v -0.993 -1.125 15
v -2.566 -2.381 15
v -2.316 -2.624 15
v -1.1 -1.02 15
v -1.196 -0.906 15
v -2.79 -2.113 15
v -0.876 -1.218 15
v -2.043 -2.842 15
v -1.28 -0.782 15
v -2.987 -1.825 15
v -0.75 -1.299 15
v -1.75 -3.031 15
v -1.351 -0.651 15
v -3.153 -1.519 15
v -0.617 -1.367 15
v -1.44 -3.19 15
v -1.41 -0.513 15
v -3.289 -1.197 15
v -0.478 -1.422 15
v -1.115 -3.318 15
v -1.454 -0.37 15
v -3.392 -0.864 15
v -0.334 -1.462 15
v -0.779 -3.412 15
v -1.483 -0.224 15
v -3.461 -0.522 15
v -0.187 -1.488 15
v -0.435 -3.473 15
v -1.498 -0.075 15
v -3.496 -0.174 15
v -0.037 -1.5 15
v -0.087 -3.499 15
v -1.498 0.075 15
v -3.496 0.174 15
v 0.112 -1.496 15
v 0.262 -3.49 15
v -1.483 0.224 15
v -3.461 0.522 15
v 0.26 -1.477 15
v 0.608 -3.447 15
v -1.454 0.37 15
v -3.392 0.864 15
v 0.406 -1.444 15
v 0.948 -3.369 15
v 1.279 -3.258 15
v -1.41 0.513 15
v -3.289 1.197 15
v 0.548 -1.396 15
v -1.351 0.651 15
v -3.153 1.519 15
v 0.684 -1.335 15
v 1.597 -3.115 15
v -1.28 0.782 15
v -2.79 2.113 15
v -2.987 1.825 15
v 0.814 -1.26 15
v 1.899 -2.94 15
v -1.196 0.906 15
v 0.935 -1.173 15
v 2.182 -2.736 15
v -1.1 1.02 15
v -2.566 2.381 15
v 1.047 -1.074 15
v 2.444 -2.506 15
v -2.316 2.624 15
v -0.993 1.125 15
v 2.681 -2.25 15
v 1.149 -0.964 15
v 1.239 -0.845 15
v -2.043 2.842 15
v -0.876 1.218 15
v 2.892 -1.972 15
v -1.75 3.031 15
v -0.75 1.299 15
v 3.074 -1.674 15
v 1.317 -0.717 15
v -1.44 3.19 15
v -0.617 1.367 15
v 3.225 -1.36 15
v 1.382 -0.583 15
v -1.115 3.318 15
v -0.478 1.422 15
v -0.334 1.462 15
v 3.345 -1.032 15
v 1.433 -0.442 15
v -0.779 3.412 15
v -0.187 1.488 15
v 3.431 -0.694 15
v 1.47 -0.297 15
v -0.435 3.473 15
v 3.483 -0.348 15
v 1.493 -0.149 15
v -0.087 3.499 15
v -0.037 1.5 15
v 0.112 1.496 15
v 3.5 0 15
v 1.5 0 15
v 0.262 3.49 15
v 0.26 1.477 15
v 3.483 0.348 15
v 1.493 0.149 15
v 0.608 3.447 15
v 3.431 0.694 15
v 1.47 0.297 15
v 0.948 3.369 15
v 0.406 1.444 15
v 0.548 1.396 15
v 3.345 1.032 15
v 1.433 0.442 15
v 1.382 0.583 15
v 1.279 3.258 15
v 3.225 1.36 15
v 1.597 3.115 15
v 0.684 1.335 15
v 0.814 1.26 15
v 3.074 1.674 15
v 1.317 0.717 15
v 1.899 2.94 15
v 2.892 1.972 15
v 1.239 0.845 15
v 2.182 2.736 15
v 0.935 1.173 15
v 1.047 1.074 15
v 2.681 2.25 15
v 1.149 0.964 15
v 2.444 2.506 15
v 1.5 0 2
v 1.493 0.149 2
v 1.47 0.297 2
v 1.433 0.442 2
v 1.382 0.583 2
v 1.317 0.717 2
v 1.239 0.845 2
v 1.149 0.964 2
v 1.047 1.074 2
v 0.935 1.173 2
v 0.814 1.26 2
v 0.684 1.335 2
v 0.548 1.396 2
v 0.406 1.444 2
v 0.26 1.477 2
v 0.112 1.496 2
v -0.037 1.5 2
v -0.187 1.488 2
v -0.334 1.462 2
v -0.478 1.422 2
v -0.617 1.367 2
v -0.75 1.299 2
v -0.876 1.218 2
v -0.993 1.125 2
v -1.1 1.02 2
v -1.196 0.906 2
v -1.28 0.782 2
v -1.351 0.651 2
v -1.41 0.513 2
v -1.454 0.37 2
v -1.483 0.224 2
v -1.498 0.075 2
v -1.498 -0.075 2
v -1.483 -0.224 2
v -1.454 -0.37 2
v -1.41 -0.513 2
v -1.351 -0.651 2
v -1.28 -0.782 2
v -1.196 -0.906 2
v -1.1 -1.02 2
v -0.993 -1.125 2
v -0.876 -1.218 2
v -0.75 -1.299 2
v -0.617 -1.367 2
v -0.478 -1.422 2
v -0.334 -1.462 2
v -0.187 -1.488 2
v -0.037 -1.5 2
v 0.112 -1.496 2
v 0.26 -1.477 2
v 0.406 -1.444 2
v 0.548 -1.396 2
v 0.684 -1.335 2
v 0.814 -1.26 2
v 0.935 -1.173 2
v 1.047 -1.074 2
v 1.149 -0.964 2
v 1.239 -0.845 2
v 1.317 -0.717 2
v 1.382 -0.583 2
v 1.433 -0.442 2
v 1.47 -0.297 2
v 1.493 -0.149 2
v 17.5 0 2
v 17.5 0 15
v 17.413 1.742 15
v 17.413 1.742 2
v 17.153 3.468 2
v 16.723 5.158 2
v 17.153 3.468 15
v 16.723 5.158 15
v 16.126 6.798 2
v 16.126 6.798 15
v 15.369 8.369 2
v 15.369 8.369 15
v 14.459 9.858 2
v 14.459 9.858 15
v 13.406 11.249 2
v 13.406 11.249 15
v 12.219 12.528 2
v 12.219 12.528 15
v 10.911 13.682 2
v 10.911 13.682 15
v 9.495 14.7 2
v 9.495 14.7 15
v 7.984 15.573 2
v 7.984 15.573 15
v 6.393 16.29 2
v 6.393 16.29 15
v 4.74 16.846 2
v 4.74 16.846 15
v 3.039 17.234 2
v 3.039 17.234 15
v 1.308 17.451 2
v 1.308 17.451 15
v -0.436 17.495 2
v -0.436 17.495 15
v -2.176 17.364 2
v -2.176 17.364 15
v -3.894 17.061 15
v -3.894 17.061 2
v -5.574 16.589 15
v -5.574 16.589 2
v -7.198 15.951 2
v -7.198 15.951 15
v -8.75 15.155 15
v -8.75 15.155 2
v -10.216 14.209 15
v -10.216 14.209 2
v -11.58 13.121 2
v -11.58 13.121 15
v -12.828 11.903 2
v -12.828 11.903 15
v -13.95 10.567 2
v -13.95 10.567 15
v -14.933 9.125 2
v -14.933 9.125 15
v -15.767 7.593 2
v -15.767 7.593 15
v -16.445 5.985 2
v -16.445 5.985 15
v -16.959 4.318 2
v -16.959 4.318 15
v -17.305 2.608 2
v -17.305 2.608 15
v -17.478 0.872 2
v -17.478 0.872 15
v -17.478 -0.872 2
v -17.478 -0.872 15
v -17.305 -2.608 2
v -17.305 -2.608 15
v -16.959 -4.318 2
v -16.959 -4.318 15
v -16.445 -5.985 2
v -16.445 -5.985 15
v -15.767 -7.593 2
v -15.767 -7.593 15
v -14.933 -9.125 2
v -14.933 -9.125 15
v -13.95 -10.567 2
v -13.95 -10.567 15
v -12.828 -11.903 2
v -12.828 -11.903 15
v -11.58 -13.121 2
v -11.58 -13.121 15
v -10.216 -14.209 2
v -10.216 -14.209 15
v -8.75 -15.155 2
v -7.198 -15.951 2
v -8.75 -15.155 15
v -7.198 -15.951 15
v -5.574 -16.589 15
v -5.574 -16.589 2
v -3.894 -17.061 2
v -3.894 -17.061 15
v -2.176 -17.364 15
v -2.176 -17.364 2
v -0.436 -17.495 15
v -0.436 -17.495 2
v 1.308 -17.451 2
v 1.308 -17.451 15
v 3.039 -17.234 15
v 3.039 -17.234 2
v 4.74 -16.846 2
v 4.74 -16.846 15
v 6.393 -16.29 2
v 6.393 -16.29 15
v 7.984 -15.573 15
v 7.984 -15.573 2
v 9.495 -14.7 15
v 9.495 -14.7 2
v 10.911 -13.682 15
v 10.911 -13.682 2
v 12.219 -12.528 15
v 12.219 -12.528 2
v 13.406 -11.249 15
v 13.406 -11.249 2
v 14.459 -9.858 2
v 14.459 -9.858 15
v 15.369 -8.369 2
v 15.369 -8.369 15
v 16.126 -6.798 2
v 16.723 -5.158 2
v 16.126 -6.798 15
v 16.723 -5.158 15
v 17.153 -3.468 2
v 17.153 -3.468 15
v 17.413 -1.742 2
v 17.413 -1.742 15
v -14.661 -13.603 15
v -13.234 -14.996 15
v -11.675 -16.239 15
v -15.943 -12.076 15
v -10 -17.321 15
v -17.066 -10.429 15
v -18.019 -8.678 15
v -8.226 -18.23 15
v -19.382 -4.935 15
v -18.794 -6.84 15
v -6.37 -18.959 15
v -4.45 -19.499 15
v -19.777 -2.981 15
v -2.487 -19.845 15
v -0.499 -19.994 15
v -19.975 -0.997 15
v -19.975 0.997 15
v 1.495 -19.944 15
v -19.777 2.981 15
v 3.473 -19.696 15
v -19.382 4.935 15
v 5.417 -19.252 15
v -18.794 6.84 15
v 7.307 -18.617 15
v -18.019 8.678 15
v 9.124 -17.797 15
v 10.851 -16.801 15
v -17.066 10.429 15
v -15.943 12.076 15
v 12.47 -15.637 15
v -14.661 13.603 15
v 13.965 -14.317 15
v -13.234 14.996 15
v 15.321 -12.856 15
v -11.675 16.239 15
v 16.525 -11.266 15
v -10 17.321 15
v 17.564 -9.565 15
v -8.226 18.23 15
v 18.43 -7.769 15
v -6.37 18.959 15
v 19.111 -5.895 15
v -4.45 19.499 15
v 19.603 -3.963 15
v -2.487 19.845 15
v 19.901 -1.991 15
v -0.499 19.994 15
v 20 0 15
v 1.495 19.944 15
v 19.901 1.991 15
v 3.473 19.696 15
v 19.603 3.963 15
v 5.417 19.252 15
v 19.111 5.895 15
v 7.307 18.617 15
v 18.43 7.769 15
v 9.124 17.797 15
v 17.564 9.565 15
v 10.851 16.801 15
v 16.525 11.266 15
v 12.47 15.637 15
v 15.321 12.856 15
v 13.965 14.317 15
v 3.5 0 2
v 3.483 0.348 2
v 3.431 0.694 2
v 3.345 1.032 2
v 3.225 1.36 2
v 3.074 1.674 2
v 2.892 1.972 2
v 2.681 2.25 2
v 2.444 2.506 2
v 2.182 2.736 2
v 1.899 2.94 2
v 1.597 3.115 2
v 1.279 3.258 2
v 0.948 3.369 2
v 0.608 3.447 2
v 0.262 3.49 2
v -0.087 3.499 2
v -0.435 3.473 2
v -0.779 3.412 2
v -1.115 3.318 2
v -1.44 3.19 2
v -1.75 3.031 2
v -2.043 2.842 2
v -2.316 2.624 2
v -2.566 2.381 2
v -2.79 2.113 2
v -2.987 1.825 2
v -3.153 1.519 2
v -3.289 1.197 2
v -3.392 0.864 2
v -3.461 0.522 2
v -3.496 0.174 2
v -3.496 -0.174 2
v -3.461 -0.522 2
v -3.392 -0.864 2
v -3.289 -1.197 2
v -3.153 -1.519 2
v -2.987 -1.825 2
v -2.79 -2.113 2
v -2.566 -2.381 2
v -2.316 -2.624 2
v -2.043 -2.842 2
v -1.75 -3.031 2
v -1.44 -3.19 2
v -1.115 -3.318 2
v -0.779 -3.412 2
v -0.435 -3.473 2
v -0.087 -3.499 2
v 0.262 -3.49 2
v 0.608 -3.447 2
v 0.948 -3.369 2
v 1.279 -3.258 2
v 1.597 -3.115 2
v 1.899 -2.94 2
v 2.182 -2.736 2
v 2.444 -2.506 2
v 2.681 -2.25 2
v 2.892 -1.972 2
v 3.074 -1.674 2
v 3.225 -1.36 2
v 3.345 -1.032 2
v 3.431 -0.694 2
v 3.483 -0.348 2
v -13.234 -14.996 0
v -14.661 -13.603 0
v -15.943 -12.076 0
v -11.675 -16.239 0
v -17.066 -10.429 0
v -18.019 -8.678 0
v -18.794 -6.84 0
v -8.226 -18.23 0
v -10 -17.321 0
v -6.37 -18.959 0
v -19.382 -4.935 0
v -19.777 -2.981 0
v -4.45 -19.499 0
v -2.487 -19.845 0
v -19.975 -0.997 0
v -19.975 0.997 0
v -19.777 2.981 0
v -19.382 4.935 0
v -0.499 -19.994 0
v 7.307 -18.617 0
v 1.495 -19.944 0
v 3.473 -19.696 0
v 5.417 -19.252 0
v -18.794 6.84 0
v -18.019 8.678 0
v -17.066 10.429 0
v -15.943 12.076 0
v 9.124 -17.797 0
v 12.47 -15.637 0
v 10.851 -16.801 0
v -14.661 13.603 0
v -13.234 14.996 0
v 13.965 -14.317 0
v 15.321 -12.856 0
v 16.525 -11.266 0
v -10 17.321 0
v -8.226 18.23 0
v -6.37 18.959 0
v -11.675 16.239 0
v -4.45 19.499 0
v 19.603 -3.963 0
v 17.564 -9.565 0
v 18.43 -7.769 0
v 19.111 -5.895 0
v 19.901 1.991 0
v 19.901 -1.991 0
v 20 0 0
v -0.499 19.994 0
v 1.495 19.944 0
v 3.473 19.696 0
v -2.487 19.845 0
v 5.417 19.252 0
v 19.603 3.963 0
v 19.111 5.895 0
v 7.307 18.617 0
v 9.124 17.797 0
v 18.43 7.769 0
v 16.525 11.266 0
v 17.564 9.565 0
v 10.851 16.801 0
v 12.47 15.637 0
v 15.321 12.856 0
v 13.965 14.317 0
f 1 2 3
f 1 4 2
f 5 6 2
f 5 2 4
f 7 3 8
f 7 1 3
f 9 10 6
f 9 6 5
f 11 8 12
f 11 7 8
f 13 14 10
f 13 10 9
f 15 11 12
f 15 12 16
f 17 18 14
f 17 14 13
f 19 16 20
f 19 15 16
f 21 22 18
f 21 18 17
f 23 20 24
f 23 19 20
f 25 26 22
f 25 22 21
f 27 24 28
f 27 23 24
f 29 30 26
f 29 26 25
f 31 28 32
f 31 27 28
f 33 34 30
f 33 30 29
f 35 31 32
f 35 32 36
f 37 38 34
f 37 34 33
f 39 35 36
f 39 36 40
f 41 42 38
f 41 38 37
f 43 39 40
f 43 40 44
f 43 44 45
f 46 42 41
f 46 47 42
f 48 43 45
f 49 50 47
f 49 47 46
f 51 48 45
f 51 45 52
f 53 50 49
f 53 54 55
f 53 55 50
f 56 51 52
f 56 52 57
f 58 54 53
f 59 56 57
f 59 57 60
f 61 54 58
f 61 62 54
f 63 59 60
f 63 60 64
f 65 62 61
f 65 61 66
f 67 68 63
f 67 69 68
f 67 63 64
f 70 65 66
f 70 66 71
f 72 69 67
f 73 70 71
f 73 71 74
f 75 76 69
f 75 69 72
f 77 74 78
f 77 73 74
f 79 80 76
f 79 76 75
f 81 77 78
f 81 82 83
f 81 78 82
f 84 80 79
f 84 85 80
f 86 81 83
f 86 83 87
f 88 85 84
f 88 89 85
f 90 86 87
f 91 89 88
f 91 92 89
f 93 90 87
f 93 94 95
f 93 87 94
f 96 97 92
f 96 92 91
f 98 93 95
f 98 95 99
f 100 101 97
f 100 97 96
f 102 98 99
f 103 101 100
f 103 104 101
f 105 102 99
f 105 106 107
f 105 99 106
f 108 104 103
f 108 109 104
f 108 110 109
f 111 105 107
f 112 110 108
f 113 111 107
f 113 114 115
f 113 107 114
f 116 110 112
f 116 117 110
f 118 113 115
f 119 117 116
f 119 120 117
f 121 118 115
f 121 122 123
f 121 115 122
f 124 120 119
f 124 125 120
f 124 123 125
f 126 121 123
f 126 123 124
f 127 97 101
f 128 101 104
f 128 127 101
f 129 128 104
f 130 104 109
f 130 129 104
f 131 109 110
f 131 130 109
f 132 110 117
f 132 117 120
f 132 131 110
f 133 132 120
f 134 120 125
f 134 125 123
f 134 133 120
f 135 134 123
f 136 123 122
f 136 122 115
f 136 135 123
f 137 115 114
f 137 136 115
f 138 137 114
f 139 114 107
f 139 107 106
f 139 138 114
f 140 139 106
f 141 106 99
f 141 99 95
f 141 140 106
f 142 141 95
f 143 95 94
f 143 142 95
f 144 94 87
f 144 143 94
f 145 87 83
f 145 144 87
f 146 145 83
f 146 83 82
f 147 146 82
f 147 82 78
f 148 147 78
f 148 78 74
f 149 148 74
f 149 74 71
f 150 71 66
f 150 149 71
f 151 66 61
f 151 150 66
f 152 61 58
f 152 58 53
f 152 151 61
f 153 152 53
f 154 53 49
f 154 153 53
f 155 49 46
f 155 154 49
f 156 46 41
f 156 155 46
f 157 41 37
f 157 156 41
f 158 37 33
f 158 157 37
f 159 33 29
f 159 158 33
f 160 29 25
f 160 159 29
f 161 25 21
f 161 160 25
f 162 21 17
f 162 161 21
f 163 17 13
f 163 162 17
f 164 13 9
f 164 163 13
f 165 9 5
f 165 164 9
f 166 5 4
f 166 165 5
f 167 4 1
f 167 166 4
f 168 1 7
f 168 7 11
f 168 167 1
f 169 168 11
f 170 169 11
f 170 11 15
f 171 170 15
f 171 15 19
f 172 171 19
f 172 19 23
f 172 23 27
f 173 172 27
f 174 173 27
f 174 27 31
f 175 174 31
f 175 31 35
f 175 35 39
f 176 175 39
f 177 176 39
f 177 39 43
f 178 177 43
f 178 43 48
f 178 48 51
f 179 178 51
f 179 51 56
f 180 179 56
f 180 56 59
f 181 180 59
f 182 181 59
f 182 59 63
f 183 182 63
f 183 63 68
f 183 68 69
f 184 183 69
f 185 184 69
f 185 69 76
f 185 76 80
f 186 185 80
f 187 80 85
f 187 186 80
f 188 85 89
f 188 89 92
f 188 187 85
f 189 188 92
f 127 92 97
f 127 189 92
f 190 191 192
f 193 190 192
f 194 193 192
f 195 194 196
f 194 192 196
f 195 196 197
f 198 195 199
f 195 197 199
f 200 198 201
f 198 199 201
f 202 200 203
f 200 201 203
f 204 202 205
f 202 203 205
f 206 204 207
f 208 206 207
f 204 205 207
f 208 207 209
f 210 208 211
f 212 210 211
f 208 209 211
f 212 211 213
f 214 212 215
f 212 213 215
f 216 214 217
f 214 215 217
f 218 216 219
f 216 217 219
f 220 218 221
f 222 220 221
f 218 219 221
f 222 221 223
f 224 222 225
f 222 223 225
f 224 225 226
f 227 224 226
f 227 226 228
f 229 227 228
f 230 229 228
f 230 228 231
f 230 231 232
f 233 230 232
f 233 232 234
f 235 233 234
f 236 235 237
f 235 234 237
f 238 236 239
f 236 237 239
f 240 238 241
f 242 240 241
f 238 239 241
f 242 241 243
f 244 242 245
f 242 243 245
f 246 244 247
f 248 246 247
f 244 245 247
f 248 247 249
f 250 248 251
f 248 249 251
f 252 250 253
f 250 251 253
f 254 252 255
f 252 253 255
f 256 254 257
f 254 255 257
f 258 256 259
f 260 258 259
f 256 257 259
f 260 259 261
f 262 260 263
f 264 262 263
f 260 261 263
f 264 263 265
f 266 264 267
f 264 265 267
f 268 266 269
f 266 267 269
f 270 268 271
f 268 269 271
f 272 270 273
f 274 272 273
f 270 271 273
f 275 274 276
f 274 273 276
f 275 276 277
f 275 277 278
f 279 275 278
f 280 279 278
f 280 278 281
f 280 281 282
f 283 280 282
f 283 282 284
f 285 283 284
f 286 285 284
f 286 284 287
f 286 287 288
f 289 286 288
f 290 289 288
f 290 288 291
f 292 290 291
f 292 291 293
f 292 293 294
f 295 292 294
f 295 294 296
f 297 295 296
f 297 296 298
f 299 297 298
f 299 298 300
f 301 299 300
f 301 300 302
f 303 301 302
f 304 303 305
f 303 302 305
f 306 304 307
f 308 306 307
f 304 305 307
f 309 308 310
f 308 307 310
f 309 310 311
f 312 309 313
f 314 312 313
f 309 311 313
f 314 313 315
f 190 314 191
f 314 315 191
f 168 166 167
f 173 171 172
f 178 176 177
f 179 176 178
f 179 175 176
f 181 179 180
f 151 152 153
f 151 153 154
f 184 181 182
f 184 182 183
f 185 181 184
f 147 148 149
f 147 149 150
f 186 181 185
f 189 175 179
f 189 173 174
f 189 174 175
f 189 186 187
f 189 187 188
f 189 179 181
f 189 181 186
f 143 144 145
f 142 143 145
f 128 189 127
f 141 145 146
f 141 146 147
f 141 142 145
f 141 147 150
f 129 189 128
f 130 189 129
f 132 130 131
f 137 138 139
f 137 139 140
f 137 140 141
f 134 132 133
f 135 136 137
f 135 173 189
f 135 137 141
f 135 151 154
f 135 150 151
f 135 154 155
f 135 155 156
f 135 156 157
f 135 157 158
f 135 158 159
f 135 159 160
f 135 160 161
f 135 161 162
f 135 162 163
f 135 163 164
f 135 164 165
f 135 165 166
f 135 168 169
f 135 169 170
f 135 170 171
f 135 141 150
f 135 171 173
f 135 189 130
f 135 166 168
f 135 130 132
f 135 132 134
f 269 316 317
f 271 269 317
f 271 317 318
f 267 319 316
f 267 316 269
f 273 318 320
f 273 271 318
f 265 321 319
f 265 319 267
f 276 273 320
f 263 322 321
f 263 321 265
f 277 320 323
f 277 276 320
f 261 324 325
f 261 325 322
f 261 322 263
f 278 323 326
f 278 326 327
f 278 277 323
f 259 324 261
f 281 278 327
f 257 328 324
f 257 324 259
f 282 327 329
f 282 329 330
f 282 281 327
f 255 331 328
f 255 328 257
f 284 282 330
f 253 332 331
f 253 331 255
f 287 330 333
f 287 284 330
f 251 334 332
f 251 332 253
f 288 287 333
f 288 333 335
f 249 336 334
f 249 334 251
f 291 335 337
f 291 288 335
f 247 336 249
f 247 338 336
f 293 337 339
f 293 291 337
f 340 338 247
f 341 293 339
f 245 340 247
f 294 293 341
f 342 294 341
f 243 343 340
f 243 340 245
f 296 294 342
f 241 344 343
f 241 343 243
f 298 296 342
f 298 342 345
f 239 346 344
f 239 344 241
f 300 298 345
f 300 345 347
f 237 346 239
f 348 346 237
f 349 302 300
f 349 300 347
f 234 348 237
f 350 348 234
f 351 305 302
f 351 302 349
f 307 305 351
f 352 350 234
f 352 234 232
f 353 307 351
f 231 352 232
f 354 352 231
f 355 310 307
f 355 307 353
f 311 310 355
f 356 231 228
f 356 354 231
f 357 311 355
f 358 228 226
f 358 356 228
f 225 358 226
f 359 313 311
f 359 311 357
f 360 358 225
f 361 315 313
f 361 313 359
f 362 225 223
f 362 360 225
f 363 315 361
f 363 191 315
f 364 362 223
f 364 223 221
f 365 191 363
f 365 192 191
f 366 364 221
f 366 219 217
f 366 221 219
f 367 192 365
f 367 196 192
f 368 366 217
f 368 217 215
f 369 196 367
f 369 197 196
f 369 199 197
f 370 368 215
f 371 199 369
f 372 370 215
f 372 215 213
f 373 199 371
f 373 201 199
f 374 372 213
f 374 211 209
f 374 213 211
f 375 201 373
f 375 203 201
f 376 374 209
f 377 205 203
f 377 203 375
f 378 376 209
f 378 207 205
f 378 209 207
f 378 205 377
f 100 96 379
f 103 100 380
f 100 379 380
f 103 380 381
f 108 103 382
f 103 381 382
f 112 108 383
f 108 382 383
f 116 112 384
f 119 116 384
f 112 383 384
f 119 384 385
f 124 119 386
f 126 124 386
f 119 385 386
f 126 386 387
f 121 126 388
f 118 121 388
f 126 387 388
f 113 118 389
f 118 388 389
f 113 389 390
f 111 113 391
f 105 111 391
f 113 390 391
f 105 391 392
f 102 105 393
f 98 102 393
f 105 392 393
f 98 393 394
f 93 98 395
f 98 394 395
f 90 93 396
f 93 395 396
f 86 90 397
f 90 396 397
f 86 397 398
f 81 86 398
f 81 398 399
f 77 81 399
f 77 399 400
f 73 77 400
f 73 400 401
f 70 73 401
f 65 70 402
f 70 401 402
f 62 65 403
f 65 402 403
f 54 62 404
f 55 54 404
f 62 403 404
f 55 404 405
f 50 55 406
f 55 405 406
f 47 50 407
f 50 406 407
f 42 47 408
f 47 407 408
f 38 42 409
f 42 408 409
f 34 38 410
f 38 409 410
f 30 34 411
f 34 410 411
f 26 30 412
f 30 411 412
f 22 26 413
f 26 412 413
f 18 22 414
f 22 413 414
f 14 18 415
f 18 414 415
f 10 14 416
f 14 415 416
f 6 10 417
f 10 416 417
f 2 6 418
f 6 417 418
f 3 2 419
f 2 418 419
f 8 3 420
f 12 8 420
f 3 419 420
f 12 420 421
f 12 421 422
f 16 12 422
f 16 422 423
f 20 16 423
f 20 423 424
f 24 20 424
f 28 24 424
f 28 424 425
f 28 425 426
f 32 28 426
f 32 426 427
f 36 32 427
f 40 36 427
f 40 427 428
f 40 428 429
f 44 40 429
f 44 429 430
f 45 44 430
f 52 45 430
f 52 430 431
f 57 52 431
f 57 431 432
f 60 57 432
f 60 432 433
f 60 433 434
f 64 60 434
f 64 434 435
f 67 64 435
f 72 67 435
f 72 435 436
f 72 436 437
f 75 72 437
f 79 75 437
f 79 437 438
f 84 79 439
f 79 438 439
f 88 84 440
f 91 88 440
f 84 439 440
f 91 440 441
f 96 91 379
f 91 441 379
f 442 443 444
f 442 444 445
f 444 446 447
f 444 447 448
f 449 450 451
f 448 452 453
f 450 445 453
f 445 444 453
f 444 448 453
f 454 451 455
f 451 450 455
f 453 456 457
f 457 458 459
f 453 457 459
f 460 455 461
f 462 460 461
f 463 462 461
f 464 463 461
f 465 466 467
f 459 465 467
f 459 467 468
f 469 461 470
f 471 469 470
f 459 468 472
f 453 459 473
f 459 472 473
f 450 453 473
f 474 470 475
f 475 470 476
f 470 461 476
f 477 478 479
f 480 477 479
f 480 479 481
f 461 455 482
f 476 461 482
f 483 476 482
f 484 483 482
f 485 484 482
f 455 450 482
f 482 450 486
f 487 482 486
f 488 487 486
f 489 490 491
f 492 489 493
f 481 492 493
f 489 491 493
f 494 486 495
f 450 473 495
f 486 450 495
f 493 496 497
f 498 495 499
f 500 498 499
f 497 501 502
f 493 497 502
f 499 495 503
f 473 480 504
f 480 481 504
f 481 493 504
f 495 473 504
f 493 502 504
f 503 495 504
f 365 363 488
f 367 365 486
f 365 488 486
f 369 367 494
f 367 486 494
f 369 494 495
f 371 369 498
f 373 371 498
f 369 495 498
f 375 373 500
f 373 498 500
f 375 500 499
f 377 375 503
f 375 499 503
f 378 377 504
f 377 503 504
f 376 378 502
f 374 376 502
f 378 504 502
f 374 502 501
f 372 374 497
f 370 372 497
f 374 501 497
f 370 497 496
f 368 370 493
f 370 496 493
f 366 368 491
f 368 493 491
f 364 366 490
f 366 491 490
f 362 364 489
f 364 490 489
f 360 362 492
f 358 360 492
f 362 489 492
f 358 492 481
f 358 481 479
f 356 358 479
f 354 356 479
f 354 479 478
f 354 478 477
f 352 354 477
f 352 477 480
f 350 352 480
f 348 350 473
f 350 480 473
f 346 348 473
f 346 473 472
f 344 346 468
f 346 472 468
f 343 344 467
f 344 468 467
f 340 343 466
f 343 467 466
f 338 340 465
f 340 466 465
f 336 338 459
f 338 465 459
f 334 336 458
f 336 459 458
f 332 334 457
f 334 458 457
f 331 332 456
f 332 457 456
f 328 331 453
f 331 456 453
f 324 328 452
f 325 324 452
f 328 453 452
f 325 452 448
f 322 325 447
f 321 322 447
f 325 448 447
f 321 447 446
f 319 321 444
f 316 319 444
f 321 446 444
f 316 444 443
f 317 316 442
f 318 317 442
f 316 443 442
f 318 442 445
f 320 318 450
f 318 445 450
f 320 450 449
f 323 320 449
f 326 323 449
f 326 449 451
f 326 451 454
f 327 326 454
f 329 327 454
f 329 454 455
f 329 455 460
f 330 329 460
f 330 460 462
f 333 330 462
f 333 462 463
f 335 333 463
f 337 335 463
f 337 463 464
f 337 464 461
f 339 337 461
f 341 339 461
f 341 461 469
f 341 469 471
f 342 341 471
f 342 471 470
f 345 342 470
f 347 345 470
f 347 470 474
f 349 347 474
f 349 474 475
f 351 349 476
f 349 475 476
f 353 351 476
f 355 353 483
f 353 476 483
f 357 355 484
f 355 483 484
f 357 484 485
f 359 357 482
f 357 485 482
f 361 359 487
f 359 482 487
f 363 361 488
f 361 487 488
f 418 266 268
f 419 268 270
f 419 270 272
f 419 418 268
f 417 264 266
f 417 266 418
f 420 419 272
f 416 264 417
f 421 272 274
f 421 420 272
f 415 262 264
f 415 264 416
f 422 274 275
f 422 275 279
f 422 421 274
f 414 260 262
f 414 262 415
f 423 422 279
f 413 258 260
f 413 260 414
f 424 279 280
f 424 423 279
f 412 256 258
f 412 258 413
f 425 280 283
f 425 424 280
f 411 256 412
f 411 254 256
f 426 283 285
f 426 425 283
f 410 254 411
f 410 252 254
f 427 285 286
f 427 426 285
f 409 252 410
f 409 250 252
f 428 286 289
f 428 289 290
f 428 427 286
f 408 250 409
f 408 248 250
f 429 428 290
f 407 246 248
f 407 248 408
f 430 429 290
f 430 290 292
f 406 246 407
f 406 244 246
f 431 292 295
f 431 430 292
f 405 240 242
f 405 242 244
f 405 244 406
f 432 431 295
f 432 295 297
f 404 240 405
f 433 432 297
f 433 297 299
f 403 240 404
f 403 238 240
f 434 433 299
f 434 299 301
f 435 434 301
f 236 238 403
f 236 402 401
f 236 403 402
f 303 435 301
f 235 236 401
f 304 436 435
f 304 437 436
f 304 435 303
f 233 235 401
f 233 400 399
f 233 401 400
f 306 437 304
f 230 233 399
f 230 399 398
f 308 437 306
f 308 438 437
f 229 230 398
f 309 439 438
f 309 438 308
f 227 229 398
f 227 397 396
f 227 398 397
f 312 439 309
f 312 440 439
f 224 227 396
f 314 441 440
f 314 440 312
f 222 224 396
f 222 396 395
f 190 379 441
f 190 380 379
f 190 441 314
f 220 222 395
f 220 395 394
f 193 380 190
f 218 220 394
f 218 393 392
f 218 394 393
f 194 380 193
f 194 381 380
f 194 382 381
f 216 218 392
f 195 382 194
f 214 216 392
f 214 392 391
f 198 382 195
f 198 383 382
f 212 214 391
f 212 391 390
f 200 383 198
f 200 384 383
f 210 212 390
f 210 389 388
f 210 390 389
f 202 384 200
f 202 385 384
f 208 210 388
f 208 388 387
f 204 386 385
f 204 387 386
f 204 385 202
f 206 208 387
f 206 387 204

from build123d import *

# Parameters (mm, degrees)
F0_R     = 20
F1_DEPTH = 15
F2_R     = 17.5
F3_DEPTH = 13
F4_R     = 3.5
F4_R_2   = 1.5
F5_DEPTH = 13


with BuildPart() as f1:
    # F0 (on Top) → F1 (new body)
    with BuildSketch(Plane.XY):
        Circle(F0_R)
    extrude(amount=F1_DEPTH)

    # F2 (on face) → F3 (cut)
    with BuildSketch(Plane.XY.offset(15)):
        Circle(F2_R)
    extrude(amount=-F3_DEPTH, mode=Mode.SUBTRACT)

    # F4 (on face) → F5 (join)
    with BuildSketch(Plane.XY.offset(2)):
        Circle(F4_R)
        Circle(F4_R_2, mode=Mode.SUBTRACT)
    extrude(amount=F5_DEPTH)


solid = f1.part
